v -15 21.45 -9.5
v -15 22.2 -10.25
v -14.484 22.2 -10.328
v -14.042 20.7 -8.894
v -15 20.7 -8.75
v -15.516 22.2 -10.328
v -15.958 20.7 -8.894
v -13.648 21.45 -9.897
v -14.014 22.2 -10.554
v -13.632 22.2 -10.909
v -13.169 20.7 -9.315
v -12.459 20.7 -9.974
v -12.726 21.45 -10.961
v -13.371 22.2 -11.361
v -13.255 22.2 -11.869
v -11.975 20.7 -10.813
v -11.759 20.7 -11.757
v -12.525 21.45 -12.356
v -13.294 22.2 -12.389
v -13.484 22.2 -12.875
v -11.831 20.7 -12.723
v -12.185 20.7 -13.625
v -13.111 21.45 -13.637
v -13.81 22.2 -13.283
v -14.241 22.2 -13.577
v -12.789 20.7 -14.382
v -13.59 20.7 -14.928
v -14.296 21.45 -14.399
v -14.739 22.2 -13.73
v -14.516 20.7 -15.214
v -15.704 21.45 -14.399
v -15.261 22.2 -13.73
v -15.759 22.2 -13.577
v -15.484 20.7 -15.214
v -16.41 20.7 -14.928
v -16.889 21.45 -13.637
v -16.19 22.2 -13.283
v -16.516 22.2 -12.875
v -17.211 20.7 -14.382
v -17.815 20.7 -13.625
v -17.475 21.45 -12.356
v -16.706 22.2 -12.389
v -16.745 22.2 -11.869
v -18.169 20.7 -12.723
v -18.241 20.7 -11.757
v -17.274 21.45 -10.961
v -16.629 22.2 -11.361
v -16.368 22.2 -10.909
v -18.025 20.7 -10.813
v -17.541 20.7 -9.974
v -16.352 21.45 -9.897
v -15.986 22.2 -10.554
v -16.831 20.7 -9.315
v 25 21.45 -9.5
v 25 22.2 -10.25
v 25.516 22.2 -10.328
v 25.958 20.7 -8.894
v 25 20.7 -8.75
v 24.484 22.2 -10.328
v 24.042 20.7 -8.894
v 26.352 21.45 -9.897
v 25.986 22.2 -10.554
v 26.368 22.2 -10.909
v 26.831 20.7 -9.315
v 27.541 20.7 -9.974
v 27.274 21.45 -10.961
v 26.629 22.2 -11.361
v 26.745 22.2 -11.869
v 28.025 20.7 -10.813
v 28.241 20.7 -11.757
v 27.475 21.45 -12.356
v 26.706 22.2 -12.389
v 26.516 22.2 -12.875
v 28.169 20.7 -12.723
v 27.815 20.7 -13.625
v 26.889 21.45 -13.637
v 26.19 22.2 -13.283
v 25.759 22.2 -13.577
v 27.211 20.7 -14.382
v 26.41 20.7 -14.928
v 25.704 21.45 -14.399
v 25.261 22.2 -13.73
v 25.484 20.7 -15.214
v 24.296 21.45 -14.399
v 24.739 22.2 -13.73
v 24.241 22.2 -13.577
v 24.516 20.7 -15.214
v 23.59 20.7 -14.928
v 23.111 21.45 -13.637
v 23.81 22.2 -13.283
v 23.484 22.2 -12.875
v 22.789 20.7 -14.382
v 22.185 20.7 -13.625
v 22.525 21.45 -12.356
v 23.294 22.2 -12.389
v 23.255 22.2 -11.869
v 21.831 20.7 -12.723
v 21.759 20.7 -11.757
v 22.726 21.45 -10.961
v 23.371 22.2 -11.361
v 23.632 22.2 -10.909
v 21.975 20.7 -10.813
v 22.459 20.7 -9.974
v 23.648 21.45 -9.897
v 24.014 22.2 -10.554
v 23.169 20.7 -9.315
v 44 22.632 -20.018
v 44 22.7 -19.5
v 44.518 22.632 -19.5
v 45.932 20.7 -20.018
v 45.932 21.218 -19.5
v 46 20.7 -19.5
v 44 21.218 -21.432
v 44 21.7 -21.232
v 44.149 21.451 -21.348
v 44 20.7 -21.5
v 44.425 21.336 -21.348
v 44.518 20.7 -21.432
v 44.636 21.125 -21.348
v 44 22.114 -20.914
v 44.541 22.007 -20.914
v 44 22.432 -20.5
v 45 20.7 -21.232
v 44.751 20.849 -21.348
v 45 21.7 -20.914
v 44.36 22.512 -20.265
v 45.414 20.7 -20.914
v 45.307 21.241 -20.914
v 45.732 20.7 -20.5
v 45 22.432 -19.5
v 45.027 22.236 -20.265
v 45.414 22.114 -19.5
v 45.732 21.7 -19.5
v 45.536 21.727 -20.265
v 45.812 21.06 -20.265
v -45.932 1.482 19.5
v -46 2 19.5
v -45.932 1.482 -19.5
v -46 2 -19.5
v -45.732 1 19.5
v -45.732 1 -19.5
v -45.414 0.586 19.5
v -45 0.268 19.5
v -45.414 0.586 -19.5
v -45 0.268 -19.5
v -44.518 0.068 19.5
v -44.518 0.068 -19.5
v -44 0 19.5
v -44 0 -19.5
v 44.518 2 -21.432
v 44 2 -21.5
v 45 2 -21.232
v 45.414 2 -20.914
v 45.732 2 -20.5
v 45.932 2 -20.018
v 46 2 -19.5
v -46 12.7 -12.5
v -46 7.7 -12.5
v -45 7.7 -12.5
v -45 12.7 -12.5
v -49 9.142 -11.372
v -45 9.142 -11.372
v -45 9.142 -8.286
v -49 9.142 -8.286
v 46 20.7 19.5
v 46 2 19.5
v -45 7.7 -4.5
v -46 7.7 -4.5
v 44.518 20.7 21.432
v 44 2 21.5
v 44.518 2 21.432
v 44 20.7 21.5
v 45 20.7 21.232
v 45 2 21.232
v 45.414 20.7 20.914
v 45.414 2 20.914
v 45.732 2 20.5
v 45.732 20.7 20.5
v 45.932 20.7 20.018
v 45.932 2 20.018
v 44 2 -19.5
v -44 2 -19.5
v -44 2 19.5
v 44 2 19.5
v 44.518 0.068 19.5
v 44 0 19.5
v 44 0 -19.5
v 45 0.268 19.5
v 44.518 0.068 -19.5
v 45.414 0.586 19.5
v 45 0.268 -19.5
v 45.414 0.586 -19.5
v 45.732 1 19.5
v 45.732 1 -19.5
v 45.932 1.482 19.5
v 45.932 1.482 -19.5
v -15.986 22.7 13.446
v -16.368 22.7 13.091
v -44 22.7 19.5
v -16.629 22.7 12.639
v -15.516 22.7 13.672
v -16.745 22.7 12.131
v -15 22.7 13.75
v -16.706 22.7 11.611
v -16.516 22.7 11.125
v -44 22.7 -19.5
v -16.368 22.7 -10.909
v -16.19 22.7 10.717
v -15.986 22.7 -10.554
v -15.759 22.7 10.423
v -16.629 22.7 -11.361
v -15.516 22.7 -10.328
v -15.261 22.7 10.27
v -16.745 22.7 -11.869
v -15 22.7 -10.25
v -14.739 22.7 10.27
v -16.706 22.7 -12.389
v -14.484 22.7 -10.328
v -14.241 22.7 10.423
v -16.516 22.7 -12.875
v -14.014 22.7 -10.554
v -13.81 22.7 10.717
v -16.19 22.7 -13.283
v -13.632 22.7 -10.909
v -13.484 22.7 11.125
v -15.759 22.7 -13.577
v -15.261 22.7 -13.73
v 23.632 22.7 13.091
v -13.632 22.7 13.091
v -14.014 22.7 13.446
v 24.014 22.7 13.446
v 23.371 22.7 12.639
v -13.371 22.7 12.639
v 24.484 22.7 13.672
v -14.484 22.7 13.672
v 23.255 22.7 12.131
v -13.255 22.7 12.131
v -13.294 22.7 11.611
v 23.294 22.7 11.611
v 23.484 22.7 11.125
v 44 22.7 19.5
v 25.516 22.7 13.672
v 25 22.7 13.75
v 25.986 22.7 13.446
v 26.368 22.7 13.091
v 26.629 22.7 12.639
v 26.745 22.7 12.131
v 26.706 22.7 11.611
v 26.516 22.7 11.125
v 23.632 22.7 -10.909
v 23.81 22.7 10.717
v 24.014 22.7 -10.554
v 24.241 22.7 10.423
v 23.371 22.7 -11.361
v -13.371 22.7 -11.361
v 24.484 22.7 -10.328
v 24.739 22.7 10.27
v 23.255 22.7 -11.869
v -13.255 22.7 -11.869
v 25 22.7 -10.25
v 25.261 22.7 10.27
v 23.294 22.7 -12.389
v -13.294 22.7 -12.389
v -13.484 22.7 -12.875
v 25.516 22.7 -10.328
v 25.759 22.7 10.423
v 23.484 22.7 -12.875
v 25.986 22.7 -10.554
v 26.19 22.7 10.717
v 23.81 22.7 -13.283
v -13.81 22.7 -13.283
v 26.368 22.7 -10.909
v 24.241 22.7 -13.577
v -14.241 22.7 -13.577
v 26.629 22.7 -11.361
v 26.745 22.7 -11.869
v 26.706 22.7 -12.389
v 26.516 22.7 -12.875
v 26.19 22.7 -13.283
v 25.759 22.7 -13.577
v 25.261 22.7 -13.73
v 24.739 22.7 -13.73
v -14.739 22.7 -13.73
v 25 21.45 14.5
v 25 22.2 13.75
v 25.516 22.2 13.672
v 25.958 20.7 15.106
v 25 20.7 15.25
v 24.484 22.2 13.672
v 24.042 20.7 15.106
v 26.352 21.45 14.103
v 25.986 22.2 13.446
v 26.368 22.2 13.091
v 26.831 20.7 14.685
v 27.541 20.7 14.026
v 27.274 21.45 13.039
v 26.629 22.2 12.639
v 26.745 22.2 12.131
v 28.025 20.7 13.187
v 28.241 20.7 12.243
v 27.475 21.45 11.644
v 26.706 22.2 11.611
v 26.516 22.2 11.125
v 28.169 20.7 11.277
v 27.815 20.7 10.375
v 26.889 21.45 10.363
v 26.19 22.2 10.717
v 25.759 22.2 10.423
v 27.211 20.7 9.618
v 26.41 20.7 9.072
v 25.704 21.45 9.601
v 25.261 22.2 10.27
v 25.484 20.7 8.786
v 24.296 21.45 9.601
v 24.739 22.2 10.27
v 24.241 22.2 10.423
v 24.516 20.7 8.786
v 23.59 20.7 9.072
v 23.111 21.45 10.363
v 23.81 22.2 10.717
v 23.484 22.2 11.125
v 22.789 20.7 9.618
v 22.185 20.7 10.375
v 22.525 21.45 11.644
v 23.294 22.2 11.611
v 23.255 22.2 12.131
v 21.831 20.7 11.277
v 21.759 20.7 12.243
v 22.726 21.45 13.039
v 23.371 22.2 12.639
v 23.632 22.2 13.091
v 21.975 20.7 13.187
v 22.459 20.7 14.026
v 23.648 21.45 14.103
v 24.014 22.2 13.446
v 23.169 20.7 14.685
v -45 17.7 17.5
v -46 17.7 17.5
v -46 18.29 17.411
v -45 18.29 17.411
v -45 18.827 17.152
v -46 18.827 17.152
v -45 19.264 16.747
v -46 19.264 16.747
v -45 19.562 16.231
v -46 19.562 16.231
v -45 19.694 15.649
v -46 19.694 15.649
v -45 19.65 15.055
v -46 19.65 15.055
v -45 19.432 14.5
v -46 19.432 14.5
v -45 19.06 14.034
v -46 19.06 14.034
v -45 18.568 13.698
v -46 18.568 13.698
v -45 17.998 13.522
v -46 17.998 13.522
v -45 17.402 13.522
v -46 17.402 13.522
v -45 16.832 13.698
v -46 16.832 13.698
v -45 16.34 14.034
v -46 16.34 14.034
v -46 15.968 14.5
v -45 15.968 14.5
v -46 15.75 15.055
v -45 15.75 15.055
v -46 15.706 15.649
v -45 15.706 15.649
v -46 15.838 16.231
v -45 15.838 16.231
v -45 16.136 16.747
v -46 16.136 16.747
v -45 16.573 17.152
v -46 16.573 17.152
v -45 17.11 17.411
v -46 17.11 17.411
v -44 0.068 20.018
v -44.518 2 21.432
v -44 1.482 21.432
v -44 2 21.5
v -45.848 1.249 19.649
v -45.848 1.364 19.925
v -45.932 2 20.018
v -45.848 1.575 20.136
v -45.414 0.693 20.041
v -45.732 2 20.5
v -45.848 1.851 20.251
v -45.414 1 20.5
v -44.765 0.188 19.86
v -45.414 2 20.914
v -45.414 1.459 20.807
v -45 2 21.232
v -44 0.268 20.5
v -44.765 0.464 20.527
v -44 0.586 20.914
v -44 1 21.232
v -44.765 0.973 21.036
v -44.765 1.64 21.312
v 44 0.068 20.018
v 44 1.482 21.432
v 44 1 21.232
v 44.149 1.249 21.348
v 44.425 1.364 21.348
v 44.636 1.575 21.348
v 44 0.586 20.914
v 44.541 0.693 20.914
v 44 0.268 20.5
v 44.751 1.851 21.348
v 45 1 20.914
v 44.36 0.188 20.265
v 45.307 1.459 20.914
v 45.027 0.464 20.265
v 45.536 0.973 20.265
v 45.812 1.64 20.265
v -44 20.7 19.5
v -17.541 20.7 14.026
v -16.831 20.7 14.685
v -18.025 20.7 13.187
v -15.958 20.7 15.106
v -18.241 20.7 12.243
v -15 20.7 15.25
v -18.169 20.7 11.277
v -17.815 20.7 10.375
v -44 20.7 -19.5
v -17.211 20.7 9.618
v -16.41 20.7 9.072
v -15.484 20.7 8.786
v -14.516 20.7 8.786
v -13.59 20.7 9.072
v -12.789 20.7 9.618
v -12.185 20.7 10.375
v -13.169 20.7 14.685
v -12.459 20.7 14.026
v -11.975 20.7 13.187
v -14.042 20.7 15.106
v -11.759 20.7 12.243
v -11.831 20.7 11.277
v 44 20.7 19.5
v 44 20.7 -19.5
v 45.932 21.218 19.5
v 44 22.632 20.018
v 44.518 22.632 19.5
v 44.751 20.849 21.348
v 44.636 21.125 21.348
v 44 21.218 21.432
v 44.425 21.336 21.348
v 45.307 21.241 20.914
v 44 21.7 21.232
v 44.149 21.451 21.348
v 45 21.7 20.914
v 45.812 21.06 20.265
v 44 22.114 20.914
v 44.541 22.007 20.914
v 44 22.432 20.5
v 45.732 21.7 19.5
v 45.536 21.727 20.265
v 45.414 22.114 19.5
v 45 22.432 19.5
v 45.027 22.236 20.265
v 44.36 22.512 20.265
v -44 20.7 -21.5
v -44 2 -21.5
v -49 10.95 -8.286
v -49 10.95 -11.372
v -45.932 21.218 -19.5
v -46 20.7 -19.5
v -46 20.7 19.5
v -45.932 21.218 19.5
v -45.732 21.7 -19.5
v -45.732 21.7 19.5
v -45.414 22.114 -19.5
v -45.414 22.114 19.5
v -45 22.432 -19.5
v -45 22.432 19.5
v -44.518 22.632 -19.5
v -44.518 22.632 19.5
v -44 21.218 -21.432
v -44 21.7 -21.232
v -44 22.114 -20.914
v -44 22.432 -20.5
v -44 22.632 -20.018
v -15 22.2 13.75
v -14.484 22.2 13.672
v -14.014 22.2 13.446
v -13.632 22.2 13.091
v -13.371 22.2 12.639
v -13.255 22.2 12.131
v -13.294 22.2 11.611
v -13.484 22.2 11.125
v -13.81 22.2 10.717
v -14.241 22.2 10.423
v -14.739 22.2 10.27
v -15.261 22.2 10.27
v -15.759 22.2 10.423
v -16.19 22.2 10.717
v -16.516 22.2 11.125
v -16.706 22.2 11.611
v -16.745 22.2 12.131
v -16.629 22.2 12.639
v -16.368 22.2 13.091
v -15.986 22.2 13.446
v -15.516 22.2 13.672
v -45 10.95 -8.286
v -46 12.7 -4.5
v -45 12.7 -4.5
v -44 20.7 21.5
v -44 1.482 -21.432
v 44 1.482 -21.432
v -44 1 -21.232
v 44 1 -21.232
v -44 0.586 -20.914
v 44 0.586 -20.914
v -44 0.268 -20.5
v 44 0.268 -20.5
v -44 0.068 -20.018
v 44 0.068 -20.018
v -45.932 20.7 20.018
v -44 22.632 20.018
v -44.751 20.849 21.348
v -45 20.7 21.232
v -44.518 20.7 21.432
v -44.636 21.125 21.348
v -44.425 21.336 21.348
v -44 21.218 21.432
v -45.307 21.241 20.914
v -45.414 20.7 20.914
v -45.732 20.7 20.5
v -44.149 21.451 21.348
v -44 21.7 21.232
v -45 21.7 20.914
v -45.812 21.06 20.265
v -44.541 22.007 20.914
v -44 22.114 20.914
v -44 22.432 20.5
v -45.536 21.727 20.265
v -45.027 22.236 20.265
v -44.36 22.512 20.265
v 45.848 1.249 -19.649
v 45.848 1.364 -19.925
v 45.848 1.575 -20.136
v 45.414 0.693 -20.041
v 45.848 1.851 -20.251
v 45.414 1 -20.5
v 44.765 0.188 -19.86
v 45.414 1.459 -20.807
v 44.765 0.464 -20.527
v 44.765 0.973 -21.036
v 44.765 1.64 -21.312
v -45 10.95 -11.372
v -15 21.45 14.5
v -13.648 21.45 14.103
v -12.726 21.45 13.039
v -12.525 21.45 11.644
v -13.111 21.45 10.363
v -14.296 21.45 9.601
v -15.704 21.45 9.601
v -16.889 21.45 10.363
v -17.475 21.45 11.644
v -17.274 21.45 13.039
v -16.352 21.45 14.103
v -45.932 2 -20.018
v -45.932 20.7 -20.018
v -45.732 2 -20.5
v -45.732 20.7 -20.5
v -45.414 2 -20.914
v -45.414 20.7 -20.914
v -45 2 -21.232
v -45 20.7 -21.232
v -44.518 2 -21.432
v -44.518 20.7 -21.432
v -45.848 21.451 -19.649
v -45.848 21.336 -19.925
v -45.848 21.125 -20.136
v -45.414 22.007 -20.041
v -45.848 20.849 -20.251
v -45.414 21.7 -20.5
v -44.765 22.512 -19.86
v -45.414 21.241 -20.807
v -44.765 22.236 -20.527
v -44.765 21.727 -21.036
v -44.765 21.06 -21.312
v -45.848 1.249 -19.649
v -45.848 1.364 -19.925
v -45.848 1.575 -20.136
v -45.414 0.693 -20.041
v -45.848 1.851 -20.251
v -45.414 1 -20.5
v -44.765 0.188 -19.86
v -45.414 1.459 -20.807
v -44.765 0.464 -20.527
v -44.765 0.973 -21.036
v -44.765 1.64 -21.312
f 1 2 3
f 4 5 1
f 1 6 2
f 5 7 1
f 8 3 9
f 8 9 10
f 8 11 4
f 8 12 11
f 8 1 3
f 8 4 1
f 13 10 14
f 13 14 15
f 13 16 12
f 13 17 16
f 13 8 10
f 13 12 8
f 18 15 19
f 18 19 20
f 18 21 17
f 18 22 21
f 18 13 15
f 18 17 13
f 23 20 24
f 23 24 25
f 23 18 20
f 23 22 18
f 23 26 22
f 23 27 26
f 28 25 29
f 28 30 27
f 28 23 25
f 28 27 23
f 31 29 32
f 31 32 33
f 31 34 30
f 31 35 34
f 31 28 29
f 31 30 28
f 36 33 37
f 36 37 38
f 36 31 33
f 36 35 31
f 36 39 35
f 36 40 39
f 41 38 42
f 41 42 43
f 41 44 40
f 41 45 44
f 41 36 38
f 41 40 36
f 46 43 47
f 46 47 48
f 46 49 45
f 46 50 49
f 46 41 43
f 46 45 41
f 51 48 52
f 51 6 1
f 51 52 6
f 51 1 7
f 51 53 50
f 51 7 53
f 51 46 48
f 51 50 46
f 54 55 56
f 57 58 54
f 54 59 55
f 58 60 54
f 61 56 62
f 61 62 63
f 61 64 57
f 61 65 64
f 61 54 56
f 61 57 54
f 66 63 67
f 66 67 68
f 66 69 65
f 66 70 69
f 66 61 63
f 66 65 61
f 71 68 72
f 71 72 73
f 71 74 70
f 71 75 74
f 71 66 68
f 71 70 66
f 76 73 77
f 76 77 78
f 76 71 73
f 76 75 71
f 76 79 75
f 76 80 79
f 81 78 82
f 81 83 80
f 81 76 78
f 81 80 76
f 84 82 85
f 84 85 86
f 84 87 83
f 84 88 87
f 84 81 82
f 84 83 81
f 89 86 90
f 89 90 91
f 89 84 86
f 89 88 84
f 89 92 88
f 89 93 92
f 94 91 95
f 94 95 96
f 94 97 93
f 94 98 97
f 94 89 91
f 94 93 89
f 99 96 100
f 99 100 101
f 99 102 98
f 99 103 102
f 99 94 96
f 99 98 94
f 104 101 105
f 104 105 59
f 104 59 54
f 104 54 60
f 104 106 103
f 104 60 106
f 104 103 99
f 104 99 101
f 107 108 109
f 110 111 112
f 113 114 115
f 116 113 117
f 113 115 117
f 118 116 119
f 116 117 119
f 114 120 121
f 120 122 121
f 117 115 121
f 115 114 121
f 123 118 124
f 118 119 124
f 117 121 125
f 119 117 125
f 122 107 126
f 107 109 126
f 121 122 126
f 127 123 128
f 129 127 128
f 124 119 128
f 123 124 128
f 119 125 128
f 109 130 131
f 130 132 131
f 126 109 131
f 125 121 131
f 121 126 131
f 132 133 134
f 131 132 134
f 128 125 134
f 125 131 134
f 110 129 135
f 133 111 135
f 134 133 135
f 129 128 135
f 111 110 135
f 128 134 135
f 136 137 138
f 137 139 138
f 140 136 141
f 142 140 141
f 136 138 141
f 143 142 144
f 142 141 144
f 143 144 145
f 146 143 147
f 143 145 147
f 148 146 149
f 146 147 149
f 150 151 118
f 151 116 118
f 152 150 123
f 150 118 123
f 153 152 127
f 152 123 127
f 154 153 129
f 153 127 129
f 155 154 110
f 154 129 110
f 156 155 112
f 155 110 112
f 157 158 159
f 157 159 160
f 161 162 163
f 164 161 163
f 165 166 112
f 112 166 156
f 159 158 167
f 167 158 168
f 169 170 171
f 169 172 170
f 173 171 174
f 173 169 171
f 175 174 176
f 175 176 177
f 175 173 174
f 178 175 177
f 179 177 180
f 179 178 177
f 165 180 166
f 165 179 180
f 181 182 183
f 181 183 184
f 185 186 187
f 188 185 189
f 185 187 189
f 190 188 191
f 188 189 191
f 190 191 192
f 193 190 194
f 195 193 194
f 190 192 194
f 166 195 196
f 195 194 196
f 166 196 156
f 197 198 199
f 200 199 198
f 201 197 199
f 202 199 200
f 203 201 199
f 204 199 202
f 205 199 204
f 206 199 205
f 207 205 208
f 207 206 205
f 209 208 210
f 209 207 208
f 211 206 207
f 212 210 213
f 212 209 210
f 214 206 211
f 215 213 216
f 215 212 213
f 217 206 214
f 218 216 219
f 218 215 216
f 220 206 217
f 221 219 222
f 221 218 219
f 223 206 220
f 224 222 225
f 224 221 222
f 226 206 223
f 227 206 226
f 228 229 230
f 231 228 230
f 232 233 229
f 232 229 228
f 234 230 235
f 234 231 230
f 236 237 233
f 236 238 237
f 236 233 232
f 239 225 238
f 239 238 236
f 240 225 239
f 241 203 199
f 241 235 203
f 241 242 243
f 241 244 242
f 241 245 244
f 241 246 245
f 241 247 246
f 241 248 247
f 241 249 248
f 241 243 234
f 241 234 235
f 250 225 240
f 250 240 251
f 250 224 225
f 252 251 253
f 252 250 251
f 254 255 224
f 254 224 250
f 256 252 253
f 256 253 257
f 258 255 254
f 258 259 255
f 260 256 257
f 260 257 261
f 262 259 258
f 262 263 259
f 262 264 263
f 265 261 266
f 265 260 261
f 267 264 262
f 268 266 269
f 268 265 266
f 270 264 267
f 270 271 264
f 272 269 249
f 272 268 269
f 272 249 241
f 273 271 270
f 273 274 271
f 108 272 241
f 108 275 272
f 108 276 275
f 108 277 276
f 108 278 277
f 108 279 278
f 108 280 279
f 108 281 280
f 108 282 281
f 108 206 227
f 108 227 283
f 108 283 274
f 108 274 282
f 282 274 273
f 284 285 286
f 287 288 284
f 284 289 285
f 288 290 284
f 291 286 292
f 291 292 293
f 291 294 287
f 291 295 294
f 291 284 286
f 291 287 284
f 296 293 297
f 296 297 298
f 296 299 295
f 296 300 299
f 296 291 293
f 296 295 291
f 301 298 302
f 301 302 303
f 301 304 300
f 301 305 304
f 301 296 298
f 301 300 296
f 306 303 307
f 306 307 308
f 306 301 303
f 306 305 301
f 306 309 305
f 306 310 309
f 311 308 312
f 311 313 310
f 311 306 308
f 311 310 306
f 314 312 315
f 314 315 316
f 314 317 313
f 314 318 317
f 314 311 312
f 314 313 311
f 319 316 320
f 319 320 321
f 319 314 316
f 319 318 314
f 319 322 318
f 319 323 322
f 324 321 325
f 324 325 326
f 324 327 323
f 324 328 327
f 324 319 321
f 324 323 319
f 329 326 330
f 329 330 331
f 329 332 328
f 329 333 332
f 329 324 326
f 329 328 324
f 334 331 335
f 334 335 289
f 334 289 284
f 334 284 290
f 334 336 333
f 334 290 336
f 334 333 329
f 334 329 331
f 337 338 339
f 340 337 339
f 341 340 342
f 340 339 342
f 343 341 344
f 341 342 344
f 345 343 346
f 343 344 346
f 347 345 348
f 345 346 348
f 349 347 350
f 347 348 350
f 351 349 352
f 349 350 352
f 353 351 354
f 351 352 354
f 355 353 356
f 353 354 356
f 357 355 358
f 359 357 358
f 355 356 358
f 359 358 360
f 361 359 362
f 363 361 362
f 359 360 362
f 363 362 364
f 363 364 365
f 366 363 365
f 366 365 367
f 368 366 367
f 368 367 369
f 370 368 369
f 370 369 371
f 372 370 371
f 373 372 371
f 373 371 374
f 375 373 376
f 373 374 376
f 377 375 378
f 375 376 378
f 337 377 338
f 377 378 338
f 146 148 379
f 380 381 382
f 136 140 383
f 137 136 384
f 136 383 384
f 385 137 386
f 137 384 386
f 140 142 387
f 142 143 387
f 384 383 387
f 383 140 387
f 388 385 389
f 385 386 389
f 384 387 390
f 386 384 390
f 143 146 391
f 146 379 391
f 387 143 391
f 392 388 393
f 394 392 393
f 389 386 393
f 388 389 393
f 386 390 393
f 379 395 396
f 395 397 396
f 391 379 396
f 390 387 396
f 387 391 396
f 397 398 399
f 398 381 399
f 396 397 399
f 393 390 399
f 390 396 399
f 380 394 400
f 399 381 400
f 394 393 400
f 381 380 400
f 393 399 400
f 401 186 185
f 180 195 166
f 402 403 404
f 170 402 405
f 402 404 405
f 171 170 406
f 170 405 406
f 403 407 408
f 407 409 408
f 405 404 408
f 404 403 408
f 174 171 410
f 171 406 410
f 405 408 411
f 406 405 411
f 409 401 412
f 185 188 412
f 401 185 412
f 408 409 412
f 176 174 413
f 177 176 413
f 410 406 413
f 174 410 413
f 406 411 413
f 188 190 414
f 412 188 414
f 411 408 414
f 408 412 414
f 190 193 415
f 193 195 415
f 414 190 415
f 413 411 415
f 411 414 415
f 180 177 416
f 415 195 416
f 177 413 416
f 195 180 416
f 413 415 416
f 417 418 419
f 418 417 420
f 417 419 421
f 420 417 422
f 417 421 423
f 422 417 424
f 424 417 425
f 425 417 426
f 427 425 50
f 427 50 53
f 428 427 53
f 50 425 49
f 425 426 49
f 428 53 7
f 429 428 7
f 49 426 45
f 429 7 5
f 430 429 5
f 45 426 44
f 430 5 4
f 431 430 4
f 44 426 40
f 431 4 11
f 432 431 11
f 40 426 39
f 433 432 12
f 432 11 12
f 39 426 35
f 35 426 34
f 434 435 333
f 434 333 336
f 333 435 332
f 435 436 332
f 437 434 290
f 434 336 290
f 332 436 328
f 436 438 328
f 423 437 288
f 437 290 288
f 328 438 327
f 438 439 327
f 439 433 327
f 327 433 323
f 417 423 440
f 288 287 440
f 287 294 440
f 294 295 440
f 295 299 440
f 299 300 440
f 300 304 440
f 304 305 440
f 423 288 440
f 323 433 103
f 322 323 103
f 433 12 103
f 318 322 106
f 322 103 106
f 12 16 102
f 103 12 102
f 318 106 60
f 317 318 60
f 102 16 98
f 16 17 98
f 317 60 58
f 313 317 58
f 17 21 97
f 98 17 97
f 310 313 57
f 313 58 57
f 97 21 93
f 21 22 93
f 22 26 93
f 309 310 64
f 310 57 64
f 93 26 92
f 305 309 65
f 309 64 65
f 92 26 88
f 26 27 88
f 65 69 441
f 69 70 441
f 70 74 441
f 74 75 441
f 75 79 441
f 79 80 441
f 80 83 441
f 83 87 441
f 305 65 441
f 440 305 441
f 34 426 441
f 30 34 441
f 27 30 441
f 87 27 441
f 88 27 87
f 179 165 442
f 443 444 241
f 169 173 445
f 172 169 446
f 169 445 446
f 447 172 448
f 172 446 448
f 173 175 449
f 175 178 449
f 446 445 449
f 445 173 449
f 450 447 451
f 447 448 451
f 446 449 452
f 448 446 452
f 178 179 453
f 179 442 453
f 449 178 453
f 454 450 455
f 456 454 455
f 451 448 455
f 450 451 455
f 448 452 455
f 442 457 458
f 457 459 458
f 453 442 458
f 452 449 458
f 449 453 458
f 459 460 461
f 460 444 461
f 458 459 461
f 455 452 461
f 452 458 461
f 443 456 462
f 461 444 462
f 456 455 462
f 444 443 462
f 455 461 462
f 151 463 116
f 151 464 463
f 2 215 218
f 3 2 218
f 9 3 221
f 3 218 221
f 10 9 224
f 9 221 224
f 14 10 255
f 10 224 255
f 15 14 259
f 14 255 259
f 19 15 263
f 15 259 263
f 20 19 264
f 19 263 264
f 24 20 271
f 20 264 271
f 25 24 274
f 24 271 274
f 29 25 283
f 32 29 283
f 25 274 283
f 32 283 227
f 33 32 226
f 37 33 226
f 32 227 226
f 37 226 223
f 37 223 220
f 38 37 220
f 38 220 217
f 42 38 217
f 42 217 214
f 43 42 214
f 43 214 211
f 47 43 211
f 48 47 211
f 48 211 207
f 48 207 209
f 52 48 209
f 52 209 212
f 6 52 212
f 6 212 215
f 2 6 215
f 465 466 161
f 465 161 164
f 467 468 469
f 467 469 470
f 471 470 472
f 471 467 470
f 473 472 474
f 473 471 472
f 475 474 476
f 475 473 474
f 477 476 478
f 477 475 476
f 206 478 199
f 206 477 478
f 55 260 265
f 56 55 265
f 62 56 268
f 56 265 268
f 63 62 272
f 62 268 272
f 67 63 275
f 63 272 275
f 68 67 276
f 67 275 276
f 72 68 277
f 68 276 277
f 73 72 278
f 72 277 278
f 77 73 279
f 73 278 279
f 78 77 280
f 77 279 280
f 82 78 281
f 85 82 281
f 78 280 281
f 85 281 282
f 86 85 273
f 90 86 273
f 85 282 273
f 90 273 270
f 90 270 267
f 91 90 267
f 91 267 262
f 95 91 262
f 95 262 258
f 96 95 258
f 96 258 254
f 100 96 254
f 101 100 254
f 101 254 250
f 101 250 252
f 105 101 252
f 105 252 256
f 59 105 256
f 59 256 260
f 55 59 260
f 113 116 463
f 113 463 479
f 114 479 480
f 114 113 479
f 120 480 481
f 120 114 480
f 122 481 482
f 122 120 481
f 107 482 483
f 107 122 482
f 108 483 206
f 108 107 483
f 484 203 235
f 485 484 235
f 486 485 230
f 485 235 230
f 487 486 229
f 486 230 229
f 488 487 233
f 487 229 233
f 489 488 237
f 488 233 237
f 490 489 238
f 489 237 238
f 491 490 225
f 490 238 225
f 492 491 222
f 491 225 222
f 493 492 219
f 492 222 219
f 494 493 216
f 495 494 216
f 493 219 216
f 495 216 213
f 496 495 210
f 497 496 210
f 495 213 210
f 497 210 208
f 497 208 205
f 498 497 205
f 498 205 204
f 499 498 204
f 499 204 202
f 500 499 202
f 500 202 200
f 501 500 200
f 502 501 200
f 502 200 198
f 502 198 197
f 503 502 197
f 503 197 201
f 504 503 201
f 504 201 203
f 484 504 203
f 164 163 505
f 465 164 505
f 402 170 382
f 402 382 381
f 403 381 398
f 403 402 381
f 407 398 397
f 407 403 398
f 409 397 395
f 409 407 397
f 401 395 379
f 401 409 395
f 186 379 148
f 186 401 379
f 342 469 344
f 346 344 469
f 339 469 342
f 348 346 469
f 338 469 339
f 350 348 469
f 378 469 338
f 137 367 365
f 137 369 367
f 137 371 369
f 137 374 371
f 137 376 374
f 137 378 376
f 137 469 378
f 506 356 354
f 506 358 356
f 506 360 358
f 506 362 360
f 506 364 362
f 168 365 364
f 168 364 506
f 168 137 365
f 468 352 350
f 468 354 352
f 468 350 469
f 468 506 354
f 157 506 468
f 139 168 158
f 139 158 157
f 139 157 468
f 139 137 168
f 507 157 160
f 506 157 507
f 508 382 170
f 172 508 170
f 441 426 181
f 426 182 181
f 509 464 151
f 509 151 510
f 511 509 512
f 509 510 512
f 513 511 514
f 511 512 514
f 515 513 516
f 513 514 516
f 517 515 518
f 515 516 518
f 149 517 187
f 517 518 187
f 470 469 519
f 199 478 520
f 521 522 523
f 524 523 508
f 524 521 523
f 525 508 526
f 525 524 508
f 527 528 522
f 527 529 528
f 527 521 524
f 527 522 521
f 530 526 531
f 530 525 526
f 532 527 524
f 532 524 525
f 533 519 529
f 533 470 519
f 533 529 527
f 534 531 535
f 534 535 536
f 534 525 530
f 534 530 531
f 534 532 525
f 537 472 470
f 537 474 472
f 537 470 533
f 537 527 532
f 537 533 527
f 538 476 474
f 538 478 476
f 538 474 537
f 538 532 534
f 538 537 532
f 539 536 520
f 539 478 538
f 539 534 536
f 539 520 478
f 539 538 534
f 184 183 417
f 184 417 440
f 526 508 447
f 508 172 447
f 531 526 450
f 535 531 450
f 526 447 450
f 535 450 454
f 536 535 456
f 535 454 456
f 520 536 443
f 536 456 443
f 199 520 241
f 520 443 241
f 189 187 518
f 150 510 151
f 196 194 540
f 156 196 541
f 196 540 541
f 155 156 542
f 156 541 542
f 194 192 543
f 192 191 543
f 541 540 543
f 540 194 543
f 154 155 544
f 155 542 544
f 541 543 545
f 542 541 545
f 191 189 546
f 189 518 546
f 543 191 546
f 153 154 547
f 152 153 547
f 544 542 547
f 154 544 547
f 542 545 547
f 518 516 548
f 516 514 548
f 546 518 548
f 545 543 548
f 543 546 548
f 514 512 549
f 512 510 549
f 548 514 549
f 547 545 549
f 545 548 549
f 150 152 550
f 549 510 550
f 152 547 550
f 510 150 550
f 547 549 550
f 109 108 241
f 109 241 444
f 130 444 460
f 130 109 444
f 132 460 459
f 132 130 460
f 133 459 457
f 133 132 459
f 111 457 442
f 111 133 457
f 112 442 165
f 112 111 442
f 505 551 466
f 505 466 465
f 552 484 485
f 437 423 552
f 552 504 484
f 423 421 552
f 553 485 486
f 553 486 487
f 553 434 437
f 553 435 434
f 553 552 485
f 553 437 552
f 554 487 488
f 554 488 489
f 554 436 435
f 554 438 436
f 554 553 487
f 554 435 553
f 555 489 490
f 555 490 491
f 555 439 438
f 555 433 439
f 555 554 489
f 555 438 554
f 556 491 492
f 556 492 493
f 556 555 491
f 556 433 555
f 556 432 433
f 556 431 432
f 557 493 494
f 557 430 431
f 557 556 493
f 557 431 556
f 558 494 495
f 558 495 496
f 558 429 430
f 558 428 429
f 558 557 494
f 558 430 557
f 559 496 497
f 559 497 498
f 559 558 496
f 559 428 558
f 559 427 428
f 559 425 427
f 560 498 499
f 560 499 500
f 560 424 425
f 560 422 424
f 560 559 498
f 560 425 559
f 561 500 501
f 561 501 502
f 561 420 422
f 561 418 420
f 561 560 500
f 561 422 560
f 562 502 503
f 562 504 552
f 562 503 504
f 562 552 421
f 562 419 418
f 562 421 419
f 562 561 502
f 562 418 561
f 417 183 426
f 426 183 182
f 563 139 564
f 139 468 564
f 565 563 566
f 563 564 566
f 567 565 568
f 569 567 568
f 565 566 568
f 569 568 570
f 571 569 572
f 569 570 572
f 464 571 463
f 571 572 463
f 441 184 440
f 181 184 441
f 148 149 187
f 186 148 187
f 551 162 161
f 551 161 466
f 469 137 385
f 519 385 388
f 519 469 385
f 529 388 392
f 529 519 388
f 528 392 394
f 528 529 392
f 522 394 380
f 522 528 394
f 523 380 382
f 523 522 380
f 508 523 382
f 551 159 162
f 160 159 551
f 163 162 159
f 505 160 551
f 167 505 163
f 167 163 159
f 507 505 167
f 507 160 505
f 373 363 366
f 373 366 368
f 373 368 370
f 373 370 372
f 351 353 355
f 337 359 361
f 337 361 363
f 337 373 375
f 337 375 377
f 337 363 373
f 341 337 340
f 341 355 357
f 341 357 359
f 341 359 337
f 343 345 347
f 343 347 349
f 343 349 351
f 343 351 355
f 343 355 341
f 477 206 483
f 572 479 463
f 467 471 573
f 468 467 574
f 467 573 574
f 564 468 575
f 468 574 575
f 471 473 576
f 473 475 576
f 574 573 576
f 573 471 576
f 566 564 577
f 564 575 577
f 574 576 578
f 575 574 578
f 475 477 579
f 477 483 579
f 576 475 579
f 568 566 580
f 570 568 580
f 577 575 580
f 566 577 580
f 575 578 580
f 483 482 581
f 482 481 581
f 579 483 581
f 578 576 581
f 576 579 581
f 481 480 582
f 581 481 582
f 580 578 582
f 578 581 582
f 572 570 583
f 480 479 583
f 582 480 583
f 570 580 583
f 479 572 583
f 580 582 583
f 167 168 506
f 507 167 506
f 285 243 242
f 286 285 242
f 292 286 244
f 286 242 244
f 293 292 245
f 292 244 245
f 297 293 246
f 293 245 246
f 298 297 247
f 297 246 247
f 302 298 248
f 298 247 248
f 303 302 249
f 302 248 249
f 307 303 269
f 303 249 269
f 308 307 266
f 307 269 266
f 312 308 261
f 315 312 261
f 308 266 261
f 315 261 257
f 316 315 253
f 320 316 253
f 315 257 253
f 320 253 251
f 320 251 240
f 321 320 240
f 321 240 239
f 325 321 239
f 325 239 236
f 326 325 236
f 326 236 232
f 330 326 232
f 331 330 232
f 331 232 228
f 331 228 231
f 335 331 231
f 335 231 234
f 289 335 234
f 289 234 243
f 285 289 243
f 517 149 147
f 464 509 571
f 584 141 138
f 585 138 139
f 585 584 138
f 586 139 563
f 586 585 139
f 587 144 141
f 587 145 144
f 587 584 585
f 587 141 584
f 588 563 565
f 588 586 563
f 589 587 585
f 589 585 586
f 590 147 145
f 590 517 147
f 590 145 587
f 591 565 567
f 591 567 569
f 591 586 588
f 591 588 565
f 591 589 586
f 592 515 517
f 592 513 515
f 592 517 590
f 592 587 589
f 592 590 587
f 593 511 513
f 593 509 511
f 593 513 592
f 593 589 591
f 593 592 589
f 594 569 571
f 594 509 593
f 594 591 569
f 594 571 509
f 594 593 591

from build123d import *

# Parameters (mm, degrees)
SKETCH1_W           = 92
SKETCH1_H           = 43
BOSS_EXTRUDE1_DEPTH = 22.7
SHELL1_T            = 2
FILLET1_R           = 2
SKETCH2_R           = 1.75
CUT_EXTRUDE1_DEPTH  = 10
SKETCH3_R           = 2
CUT_EXTRUDE2_DEPTH  = 1
SKETCH6_W           = 8
SKETCH6_H           = 5
CUT_EXTRUDE3_DEPTH  = 1
SKETCH7_W           = 3.085341893
SKETCH7_H           = 1.807128823
BOSS_EXTRUDE2_DEPTH = 4
CHAMFER1_SIZE       = 1.5


with BuildPart() as part:
    # Sketch1 → Boss-Extrude1 (new body)
    with BuildSketch(Plane(origin=(0, 0, 0), x_dir=(1, 0, 0), z_dir=(0, 1, 0))):
        Rectangle(SKETCH1_W, SKETCH1_H)
    extrude(amount=BOSS_EXTRUDE1_DEPTH)

    # Shell1 (no face opened: a closed hollow body)
    add(offset(amount=-SHELL1_T, mode=Mode.PRIVATE), mode=Mode.SUBTRACT)

    # Fillet1
    fillet1_edges = [part.edges().sort_by_distance(p)[0] for p in [
        (46, 22.7, 0),
        (0, 22.7, -21.5),
        (-46, 22.7, 0),
        (0, 0, -21.5),
        (46, 0, 0),
        (0, 0, 21.5),
        (-46, 0, 0),
        (-46, 11.35, -21.5),
        (46, 11.35, -21.5),
        (46, 11.35, 21.5),
        (-46, 11.35, 21.5),
        (0, 22.7, 21.5),
    ]]
    fillet(fillet1_edges, radius=FILLET1_R)

    # Sketch2 → Cut-Extrude1 (cut)
    with BuildSketch(Plane(origin=(0, 22.7, 0), x_dir=(1, 0, 0), z_dir=(0, 1, 0))):
        with Locations(Location((-15, 12, 0), (0, 0, 270))):
            Circle(SKETCH2_R)
        with Locations(Location((-15, -12, 0), (0, 0, 270))):
            Circle(SKETCH2_R)
        with Locations(Location((25, -12, 0), (0, 0, 270))):
            Circle(SKETCH2_R)
        with Locations(Location((25, 12, 0), (0, 0, 270))):
            Circle(SKETCH2_R)
    extrude(amount=-CUT_EXTRUDE1_DEPTH, mode=Mode.SUBTRACT)

    # Sketch3 → Cut-Extrude2 (cut)
    with BuildSketch(Plane.ZY.offset(46)):
        with Locations((15.5, 17.7)):
            Circle(SKETCH3_R)
    extrude(amount=-CUT_EXTRUDE2_DEPTH, mode=Mode.SUBTRACT)

    # Sketch6 → Cut-Extrude3 (cut)
    with BuildSketch(Plane.ZY.offset(46)):
        with Locations((-8.5, 10.2)):
            Rectangle(SKETCH6_W, SKETCH6_H)
    extrude(amount=-CUT_EXTRUDE3_DEPTH, mode=Mode.SUBTRACT)

    # Sketch7 → Boss-Extrude2 (add)
    with BuildSketch(Plane.ZY.offset(45)):
        with Locations((-9.829017748, 10.046015555)):
            Rectangle(SKETCH7_W, SKETCH7_H)
    extrude(amount=BOSS_EXTRUDE2_DEPTH)

    # Chamfer1
    chamfer1_edges = [part.edges().sort_by_distance(p)[0] for p in [
        (25, 20.7, -13.75),
        (25, 20.7, 10.25),
        (-15, 20.7, 10.25),
        (-15, 20.7, -13.75),
    ]]
    chamfer(chamfer1_edges, length=CHAMFER1_SIZE)


solid = part.part
